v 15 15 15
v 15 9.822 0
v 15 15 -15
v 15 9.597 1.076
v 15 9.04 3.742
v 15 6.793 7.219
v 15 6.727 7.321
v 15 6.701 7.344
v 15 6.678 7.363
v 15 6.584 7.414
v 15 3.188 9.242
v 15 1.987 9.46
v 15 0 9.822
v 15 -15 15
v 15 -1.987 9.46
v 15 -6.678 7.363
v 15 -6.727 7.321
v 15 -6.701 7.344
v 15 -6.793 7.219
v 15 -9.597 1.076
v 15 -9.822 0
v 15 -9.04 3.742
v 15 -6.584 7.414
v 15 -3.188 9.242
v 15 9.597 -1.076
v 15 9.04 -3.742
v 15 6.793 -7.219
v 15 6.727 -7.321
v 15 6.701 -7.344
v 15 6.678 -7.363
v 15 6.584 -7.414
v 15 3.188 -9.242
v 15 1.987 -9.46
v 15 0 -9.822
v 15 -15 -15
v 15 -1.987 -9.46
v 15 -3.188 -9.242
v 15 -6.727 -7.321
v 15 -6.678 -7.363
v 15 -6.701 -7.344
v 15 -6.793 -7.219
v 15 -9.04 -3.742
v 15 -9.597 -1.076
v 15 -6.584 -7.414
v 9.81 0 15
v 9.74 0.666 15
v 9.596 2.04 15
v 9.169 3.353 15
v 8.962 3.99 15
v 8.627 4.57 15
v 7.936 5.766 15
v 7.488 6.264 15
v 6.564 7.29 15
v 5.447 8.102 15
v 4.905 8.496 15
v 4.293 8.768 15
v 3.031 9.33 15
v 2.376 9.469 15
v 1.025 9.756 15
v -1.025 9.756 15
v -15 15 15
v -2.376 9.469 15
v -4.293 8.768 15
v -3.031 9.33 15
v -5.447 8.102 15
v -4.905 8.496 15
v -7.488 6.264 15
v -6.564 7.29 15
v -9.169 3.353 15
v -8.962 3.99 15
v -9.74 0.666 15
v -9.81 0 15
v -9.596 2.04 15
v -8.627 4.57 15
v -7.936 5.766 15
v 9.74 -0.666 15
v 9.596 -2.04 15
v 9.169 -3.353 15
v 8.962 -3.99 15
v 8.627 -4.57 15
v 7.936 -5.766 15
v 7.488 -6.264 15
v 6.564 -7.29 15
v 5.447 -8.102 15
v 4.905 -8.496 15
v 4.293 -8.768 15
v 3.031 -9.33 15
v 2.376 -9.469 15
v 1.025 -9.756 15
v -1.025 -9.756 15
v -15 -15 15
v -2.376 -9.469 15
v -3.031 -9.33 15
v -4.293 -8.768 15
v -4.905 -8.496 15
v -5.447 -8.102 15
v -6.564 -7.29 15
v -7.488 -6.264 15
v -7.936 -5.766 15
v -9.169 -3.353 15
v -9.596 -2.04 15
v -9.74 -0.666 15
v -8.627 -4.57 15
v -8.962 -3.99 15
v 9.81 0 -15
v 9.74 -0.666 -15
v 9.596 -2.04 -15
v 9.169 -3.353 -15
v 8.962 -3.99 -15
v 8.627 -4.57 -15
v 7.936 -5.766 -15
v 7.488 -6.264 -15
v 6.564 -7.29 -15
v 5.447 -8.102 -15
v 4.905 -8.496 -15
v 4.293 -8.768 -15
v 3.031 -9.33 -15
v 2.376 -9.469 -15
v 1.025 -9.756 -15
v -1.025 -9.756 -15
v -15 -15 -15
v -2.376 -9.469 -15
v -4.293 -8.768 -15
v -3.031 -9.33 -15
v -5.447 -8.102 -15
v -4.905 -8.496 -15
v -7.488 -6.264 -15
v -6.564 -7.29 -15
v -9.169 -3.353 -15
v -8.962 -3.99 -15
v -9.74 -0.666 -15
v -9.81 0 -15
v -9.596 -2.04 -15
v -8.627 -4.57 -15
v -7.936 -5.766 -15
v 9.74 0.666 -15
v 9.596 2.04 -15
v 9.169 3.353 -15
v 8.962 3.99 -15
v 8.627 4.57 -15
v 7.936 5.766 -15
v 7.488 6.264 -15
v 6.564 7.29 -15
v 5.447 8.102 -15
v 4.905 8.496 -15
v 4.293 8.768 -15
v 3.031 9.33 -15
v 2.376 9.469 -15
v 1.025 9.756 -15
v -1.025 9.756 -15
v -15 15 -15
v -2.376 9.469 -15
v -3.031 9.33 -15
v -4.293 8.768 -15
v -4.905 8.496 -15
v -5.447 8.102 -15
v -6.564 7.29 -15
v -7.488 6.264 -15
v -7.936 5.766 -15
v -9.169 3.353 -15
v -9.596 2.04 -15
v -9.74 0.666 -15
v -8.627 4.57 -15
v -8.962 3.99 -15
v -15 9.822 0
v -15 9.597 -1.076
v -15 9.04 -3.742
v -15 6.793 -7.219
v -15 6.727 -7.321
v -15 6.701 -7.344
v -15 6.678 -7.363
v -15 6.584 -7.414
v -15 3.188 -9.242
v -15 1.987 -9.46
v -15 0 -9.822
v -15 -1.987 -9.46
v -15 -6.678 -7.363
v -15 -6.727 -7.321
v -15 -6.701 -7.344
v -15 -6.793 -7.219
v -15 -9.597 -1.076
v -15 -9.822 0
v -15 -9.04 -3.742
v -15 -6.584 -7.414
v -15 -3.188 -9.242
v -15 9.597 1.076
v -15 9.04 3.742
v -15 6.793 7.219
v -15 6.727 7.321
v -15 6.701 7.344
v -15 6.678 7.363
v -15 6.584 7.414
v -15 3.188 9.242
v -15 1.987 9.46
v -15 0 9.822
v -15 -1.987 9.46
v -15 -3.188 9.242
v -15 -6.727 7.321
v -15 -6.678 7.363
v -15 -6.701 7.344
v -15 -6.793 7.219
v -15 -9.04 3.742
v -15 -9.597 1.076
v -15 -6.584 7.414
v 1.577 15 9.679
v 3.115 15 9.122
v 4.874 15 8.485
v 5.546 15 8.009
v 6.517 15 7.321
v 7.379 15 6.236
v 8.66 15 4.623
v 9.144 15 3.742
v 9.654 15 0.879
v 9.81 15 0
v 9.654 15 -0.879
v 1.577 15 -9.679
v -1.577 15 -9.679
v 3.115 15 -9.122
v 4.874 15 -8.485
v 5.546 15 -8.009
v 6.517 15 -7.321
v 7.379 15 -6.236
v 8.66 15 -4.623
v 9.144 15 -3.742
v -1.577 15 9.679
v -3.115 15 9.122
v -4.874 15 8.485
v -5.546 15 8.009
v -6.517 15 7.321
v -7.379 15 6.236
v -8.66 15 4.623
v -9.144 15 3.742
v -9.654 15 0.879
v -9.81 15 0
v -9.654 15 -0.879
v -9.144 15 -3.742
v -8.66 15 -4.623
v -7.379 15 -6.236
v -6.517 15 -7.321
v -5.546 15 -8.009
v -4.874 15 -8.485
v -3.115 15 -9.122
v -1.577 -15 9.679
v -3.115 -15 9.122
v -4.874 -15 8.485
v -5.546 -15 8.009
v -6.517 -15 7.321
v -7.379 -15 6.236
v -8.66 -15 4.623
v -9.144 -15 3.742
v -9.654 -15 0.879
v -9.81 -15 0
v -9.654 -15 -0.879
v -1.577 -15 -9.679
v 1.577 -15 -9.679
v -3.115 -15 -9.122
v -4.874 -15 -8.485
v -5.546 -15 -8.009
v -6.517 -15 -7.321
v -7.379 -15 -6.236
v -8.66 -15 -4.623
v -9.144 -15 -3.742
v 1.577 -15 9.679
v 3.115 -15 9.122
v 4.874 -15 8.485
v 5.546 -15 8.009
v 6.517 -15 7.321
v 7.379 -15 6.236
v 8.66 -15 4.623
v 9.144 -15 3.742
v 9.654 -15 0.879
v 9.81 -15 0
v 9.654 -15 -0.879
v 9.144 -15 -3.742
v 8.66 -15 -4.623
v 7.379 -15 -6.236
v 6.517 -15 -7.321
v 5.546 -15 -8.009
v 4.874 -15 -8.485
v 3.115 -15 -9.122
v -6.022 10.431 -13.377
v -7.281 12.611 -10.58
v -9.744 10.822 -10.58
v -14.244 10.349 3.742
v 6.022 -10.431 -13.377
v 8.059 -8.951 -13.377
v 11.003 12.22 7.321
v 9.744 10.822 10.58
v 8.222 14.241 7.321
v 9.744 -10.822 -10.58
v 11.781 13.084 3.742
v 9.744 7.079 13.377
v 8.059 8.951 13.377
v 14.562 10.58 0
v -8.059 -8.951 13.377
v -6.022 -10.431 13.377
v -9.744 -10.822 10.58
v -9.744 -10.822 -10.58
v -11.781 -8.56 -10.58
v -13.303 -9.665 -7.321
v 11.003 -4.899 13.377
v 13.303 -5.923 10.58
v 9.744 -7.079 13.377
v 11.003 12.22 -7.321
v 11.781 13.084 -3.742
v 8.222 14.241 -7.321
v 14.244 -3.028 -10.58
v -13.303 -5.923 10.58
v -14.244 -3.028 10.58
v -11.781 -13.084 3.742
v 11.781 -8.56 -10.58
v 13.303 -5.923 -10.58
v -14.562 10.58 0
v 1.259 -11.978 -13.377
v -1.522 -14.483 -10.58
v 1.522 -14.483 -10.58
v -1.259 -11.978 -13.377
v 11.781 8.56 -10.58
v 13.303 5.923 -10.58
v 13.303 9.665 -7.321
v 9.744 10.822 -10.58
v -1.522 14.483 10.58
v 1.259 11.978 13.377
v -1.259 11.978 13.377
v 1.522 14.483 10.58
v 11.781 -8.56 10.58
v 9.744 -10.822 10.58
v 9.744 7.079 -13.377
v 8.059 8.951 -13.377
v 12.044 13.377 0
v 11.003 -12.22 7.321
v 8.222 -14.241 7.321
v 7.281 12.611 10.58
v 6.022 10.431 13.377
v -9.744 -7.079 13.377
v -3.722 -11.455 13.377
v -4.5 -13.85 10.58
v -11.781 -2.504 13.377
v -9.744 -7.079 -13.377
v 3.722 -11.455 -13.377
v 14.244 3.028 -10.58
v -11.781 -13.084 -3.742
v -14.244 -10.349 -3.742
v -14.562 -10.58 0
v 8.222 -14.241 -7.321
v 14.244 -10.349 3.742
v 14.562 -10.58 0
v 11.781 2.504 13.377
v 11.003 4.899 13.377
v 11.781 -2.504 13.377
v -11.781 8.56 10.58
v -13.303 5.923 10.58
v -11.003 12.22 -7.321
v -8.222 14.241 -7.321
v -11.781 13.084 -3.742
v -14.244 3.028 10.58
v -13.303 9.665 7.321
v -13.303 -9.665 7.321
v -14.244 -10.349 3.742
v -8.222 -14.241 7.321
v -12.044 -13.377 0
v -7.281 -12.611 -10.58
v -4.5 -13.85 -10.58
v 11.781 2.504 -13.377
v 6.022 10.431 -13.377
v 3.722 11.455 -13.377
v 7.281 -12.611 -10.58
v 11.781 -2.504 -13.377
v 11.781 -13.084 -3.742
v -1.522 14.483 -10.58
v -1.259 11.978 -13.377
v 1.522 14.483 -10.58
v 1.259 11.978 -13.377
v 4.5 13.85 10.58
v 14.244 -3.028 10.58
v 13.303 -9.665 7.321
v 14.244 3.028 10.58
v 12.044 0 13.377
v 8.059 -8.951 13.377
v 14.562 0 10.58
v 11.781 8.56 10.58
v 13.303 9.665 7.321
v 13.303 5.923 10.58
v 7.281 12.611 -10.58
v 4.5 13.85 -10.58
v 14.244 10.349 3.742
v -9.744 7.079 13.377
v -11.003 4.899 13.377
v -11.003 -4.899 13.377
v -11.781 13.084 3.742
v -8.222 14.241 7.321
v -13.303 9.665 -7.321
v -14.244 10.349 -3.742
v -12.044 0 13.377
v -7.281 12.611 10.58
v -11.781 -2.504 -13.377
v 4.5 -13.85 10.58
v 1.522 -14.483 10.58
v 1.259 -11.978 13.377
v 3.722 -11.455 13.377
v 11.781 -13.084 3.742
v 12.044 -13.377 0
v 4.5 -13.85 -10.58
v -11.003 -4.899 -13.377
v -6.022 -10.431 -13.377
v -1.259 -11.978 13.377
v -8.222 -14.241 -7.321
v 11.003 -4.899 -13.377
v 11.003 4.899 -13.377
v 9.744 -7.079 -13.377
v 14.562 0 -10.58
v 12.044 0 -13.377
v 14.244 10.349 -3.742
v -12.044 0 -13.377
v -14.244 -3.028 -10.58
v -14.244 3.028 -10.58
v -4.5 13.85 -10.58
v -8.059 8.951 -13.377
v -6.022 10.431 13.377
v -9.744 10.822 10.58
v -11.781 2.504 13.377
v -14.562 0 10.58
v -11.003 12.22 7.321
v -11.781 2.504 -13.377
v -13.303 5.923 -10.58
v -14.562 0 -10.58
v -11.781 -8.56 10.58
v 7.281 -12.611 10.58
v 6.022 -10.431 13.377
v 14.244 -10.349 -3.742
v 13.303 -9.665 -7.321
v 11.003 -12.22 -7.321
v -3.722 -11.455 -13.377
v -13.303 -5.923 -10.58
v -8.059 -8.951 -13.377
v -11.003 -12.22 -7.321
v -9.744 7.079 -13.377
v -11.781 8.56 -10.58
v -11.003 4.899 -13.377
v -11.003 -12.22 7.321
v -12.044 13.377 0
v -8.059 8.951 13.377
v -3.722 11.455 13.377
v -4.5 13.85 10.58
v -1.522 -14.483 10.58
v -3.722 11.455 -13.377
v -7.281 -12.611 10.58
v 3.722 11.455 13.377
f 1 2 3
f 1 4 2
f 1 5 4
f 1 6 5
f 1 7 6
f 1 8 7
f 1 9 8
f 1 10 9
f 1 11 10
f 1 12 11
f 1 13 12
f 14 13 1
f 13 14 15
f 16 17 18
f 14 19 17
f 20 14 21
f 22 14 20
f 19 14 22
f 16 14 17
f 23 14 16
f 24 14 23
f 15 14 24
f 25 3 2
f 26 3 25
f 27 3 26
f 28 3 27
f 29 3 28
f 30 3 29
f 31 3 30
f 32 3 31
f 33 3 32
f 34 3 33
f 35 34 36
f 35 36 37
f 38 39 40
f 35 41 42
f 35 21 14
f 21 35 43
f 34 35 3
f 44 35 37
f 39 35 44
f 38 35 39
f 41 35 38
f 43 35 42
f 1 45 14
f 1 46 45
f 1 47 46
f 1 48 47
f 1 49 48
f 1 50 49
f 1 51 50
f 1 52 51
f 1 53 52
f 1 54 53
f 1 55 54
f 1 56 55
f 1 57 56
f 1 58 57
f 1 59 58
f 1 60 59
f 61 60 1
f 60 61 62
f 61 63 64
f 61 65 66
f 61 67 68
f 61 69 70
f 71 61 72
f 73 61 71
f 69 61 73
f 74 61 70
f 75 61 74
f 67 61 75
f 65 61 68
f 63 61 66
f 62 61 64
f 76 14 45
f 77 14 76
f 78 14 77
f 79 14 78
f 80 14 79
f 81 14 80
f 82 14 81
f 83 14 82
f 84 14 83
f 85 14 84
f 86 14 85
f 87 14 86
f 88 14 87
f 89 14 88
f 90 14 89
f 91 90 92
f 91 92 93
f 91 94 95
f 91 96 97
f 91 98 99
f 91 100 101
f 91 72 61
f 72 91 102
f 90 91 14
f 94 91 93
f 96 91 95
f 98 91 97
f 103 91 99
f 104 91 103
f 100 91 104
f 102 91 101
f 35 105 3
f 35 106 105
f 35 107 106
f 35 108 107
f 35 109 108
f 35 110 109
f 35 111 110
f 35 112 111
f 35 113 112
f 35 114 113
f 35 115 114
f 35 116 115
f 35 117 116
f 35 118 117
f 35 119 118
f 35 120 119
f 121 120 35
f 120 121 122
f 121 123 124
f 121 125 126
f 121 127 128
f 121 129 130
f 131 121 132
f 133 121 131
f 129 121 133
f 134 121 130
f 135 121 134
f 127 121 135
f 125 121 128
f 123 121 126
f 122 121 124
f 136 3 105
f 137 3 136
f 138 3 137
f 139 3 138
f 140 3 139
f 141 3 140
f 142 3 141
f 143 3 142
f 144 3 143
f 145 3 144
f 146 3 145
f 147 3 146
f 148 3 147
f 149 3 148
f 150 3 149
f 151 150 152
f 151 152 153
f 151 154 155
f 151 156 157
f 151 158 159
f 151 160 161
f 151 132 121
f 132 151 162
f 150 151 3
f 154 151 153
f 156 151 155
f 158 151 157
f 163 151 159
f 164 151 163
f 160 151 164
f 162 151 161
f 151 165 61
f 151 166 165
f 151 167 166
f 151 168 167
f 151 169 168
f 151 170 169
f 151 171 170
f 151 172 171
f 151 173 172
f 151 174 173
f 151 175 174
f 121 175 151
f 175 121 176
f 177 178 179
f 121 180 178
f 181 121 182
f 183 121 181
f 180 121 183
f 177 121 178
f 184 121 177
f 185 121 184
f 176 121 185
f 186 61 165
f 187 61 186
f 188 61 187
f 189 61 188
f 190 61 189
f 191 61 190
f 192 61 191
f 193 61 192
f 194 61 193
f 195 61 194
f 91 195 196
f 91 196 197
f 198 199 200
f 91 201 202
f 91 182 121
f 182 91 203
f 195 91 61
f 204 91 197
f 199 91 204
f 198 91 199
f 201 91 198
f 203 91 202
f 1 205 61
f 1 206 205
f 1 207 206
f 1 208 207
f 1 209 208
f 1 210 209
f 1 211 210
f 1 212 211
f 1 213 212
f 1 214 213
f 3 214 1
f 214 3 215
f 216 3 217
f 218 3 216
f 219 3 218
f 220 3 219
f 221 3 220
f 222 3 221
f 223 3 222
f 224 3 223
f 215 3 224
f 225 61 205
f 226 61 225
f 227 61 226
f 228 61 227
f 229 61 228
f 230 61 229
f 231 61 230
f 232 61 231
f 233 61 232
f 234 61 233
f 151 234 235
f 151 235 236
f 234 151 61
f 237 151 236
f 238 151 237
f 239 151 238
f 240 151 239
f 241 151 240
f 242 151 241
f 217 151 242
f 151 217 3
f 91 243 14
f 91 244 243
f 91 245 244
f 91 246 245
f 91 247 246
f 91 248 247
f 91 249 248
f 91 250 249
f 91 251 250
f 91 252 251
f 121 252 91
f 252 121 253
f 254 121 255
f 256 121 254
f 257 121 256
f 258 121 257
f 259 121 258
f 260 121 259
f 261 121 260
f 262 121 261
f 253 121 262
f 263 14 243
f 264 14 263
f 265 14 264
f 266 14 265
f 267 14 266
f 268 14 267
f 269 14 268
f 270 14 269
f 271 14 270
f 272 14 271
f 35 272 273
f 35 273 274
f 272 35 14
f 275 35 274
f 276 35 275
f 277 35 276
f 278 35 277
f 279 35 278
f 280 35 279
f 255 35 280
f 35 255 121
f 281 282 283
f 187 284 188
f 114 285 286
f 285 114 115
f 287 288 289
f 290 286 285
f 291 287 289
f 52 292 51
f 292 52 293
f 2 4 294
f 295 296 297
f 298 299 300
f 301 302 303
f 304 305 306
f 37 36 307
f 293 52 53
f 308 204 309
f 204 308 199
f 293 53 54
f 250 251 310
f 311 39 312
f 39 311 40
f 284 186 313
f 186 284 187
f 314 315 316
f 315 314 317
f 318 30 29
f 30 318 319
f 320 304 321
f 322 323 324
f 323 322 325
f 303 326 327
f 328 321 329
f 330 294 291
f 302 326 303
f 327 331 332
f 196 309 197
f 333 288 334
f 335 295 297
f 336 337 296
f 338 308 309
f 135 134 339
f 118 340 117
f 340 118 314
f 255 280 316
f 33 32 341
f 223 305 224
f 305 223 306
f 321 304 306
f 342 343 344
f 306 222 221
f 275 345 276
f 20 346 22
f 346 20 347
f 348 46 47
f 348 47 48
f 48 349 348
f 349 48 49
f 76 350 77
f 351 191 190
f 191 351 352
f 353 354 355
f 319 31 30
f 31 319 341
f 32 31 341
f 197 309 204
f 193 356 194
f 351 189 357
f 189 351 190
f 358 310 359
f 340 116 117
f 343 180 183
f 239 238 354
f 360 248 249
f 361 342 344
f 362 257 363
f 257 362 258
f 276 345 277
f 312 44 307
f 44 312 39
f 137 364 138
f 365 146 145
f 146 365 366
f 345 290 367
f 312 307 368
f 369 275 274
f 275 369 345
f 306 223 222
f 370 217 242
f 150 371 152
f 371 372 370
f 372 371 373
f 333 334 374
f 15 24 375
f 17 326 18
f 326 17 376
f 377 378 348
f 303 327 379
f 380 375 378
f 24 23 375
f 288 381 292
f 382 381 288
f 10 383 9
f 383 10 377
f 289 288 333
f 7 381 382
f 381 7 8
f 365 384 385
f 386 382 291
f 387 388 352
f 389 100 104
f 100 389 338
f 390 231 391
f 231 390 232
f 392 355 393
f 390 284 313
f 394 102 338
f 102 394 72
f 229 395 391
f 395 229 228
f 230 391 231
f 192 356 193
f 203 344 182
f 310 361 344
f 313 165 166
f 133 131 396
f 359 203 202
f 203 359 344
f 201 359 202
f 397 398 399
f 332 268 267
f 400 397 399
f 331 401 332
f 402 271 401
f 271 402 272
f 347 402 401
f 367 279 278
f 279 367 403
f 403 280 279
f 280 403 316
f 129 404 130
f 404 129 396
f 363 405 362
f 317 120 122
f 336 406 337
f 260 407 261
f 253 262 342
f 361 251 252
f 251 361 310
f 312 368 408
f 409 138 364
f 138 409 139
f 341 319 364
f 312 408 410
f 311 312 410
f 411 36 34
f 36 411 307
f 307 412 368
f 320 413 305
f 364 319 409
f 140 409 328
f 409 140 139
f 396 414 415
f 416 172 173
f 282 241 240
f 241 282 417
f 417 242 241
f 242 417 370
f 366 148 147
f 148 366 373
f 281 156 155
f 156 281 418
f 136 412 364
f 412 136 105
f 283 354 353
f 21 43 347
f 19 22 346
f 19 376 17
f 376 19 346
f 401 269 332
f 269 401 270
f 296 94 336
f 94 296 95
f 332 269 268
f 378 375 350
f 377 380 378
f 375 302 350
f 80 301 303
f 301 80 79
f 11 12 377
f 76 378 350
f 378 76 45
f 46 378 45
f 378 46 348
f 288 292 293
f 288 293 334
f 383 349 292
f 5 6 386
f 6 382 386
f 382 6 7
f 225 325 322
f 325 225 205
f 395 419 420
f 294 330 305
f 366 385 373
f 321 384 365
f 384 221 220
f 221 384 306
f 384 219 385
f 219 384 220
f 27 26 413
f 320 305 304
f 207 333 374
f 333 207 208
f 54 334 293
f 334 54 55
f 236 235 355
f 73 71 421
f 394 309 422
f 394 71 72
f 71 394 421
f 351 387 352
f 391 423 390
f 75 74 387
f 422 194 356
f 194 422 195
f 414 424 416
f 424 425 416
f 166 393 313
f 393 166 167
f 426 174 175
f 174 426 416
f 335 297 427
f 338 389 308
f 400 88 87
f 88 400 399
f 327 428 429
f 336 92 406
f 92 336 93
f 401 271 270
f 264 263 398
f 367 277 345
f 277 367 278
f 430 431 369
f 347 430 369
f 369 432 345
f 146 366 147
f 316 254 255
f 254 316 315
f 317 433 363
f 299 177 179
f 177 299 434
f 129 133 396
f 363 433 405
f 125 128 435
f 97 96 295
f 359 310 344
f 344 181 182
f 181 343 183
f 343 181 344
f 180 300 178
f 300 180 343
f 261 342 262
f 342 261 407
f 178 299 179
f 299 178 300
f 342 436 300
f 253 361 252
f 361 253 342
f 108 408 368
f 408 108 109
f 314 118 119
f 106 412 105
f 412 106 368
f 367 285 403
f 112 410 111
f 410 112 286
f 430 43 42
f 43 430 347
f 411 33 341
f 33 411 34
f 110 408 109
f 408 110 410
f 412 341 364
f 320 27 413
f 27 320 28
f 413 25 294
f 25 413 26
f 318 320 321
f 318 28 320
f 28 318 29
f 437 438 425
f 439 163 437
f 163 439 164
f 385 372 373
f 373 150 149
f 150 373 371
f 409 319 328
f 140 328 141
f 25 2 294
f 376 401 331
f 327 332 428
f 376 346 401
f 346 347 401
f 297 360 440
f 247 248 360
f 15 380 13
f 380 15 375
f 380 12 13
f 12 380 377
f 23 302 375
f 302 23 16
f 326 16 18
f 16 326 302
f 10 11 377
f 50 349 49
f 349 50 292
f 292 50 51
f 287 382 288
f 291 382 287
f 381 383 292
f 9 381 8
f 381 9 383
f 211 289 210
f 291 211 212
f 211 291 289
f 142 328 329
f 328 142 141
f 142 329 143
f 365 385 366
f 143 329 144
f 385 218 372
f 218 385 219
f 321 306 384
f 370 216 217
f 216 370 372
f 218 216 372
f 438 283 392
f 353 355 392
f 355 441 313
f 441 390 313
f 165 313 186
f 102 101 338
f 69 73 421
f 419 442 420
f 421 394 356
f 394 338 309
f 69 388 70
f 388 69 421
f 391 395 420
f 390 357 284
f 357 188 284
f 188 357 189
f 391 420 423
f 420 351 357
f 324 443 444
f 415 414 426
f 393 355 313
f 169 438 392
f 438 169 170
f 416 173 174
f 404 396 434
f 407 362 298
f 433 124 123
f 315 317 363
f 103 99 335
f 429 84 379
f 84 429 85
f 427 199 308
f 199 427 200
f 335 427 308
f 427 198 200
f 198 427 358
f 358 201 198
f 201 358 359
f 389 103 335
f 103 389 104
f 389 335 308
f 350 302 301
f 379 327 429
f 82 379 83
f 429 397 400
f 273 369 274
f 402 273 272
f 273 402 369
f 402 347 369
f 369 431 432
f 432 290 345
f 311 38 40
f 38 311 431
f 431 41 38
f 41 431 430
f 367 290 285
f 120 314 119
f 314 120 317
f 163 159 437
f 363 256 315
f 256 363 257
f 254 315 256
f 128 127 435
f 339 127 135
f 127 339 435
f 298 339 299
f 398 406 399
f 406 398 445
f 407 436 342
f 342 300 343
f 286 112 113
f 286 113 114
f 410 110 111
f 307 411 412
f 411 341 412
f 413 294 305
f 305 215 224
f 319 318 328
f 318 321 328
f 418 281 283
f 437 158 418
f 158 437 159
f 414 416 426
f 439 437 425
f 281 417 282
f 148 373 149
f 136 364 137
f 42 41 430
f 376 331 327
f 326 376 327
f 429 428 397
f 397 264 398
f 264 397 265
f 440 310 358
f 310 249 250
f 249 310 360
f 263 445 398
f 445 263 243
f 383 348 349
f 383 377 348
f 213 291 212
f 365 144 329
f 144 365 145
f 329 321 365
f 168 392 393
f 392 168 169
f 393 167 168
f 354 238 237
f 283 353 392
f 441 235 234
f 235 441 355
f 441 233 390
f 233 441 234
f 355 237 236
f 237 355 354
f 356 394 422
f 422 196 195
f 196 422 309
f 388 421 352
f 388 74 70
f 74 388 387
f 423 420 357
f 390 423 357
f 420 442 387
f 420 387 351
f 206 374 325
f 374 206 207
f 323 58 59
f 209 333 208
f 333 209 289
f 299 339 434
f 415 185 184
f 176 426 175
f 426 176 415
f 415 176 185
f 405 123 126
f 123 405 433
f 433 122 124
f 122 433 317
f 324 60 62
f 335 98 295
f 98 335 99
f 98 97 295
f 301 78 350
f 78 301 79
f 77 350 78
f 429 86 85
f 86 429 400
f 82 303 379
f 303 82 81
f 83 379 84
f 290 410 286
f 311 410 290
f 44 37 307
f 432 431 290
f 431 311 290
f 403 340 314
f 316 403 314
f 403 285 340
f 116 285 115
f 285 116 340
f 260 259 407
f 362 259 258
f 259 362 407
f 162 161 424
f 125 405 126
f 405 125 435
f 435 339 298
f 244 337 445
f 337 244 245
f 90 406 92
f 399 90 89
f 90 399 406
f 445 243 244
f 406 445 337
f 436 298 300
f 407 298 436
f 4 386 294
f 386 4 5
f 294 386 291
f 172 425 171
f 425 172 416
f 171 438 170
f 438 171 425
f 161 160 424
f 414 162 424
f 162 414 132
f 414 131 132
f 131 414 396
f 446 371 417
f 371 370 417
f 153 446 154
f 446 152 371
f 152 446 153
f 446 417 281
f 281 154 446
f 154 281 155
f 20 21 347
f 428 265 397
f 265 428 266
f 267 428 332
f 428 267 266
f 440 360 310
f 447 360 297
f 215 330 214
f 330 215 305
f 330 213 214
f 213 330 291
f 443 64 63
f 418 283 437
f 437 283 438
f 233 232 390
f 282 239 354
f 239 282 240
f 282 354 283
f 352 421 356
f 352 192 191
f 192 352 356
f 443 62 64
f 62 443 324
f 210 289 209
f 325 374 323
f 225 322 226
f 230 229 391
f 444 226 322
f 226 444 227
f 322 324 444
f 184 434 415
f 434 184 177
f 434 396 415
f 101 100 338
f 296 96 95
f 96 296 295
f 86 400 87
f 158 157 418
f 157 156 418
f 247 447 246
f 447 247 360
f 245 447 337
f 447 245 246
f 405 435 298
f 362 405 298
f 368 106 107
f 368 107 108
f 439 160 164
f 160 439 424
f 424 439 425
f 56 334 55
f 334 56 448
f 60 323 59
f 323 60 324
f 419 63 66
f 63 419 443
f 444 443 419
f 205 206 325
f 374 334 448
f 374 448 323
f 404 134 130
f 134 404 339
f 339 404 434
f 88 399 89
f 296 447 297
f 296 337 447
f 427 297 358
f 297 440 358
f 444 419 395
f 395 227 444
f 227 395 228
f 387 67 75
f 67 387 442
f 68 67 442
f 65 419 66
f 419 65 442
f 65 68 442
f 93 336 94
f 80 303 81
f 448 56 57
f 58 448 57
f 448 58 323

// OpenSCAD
difference() {
	cube([30, 30, 30], center=true);
	sphere(r=18);
}

/*cylinder(h=30, center=true);
rotate([0, 90, 90]) cylinder(h=30, center=true);
rotate([90, 0, 90]) cylinder(h=30, center=true);

translate([0,0,14]) rotate([90, 0, 90]) cylinder(h=30, center=true);*/
